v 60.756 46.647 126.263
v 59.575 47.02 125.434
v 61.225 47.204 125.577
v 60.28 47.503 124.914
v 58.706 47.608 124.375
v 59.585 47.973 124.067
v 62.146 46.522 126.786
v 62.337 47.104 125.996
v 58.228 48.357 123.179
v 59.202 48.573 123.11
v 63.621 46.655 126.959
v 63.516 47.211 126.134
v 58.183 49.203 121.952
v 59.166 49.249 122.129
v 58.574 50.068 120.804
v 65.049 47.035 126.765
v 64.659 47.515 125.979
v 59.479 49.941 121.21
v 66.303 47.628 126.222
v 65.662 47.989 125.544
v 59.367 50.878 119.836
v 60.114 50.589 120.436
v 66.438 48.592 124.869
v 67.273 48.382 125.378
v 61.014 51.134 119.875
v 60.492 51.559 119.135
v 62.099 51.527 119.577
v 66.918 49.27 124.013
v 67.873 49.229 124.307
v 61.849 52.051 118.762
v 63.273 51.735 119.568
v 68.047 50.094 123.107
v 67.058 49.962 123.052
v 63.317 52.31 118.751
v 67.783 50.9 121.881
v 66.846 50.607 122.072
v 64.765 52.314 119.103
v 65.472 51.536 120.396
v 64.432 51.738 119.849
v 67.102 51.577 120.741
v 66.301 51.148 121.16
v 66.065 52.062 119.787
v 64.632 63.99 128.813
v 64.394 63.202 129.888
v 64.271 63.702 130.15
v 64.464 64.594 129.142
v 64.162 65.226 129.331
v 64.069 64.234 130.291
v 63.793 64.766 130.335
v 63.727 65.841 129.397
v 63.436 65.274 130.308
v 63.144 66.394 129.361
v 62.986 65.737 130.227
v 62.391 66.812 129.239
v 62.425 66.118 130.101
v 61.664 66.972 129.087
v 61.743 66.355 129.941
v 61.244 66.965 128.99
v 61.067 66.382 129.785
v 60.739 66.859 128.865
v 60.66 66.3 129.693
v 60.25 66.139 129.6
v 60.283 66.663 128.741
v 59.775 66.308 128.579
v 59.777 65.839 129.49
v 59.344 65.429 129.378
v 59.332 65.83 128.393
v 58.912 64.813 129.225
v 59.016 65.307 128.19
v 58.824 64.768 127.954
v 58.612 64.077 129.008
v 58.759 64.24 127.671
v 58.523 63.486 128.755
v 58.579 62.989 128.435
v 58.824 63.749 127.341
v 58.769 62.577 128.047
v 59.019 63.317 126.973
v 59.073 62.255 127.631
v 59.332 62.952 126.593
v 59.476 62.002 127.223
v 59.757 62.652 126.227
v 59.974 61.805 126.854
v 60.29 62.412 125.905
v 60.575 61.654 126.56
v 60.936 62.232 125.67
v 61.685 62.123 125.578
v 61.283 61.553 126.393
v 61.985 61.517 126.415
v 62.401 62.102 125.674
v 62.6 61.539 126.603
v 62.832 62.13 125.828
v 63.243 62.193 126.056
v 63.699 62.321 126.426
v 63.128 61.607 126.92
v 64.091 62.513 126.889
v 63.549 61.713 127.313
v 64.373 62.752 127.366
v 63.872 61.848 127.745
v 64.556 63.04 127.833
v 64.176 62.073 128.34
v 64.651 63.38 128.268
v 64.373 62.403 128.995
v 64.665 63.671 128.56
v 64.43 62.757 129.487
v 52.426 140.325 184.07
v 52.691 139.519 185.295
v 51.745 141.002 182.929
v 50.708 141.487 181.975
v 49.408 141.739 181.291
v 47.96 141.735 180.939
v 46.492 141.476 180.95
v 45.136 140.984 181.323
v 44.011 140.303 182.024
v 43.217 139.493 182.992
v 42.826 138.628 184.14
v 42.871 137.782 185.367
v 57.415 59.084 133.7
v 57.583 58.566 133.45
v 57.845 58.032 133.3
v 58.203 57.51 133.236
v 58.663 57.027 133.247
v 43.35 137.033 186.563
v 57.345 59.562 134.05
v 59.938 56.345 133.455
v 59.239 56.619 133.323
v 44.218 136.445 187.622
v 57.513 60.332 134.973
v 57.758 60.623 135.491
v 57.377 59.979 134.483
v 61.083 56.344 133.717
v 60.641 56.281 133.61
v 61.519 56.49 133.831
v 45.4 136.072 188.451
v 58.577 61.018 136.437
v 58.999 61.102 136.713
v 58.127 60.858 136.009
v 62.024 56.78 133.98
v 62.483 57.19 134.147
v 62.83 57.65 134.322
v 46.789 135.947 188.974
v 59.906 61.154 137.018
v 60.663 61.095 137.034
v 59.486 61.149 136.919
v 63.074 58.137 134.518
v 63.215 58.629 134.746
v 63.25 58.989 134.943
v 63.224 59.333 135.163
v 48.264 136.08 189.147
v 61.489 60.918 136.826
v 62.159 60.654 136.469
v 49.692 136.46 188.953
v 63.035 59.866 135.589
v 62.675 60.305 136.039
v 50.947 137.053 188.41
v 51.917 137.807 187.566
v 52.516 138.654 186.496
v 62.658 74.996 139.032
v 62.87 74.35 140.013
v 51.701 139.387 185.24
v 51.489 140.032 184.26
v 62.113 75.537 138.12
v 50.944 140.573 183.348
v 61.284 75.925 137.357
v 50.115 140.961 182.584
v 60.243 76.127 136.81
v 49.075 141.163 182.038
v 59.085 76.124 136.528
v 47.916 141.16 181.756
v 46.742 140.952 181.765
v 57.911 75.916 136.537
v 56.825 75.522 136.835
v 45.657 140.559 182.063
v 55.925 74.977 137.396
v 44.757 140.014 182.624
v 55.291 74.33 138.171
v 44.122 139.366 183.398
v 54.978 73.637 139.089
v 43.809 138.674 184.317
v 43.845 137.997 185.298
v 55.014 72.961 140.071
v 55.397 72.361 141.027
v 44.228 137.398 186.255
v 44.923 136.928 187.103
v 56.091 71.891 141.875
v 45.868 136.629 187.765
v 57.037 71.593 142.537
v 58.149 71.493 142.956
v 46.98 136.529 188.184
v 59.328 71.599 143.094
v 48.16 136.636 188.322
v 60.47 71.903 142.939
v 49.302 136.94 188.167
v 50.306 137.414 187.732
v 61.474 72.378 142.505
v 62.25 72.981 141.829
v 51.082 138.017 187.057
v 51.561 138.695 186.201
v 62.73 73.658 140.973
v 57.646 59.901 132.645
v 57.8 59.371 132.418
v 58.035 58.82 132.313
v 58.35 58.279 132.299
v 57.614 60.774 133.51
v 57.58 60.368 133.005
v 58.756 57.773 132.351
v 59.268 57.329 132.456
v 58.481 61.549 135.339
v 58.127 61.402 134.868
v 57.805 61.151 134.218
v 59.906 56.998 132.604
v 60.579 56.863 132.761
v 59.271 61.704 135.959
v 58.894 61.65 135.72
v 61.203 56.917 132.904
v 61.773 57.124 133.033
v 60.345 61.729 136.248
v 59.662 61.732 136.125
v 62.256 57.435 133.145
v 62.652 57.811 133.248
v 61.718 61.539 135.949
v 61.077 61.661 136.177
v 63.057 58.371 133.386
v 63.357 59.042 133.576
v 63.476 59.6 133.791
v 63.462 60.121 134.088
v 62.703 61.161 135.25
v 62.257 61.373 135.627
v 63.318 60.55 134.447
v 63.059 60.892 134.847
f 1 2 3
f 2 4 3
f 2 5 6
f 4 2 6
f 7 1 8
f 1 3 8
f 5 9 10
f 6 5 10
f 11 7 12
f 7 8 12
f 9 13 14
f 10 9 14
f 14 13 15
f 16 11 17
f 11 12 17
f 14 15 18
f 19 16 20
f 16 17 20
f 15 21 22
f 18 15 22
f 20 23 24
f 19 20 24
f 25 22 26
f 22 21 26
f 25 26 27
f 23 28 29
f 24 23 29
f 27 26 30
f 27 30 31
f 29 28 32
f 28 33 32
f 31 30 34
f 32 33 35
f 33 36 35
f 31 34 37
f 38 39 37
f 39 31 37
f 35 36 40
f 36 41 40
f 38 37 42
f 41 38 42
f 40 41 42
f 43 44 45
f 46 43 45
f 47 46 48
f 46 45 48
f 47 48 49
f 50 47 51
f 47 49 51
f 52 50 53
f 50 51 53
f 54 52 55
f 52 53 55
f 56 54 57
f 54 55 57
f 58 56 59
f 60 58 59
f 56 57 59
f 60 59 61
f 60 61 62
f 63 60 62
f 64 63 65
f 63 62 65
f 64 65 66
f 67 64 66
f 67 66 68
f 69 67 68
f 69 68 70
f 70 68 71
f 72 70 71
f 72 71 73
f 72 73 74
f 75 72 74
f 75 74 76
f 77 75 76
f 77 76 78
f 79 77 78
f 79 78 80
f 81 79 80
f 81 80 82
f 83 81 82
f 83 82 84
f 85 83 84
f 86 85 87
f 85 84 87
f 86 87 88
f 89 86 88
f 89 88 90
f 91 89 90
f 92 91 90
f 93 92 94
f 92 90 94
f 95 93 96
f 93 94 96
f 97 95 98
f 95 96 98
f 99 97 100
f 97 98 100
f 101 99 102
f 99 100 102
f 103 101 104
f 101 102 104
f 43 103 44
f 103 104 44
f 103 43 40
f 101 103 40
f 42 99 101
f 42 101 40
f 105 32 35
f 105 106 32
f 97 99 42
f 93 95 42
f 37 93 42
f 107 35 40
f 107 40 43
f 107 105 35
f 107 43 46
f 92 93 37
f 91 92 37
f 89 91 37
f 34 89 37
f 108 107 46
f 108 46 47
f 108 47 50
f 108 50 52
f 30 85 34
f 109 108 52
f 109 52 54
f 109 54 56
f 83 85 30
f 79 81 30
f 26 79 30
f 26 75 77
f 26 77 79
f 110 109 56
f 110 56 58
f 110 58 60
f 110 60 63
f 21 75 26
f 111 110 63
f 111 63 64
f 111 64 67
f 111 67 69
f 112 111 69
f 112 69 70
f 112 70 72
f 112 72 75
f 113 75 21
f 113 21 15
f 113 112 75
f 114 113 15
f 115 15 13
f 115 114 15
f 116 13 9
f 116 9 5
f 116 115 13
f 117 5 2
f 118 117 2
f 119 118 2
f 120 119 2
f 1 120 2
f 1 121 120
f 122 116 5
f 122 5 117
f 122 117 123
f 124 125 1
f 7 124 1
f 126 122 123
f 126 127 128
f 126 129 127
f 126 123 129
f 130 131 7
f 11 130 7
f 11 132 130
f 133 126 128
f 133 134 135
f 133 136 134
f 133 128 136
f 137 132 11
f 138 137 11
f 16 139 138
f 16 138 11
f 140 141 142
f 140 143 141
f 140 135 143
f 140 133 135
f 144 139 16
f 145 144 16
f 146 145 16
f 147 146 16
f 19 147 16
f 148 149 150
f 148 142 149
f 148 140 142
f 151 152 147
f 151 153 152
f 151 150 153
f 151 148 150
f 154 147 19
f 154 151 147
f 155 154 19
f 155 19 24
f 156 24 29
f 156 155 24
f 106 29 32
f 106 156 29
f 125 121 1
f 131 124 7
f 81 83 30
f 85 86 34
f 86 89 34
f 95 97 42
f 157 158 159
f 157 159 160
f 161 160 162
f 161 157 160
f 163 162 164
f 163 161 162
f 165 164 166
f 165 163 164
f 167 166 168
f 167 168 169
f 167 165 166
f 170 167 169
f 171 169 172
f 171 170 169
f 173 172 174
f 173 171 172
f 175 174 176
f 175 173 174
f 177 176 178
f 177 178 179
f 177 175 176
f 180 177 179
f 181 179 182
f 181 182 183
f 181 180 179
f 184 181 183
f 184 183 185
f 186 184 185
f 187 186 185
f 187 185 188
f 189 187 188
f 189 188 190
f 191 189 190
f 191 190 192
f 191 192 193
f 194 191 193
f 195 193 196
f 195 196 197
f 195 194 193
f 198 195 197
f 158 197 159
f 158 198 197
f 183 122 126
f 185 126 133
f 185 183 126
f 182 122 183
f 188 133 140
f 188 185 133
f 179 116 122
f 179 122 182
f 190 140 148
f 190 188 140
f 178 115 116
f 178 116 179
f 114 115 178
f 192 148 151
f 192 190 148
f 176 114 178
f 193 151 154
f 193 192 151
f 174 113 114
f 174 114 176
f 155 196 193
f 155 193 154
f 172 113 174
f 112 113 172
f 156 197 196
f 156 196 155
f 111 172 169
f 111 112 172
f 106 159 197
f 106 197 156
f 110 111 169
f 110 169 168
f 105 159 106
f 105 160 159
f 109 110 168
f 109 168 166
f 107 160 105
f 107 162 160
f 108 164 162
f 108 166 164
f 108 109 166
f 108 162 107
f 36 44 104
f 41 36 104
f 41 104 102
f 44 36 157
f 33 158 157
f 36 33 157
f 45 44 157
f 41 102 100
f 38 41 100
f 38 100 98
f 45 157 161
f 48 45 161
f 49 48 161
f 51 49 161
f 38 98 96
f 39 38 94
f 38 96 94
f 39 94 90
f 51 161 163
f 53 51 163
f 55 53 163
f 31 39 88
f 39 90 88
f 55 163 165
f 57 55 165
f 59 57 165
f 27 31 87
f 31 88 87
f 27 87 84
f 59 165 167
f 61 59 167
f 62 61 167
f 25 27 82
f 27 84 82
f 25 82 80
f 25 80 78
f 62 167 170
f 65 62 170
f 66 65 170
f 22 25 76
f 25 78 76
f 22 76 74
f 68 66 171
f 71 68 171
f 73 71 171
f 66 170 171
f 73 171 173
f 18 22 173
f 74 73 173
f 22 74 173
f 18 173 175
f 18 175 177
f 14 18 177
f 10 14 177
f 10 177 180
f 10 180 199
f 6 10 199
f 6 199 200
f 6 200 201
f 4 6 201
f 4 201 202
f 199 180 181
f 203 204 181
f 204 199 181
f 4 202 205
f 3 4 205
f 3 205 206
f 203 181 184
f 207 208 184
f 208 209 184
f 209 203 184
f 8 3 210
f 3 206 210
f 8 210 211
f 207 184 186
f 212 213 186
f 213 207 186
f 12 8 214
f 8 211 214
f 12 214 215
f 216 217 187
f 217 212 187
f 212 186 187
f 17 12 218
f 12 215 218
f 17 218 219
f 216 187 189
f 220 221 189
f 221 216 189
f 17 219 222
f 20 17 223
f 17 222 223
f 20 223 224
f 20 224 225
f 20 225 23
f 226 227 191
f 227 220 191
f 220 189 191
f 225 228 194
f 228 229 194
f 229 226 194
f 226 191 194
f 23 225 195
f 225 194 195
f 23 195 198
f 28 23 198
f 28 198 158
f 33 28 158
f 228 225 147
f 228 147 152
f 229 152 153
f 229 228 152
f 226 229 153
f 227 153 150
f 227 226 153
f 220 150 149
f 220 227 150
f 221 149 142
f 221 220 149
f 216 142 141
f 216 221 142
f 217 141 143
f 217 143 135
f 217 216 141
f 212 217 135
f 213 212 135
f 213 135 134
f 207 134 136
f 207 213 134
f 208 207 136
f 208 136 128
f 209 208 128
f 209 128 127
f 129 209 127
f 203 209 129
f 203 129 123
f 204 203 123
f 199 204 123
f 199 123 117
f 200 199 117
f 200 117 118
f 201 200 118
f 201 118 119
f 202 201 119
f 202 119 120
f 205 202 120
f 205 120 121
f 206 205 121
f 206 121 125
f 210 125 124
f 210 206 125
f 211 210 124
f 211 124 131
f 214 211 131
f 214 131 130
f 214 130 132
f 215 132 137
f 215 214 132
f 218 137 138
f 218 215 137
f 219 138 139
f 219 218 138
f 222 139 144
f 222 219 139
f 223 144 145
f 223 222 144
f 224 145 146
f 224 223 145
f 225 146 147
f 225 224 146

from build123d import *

# Parameters (mm, degrees)
SKETCH1_R                = 5
SKETCH1_R_2              = 4
BOSS_EXTRUDE1_DEPTH      = 80
BOSS_EXTRUDE1_DEPTH_BACK = 30
SKETCH2_R                = 3
CUT_EXTRUDE1_DEPTH       = 58.904930039
CUT_EXTRUDE1_DEPTH_BACK  = 58.904930039


with BuildPart() as part:
    # Sketch1 → Boss-Extrude1 (new body, two sides)
    with BuildSketch(Plane(origin=(-18.263591419, 106.35230846, 73.959767463), x_dir=(0.989737493, 0.132142803, 0.054387259), z_dir=(-0.139606326, 0.812953742, 0.565346165))) as boss_extrude1_sk:
        with Locations((75.664084078, -74.988676697)):
            Circle(SKETCH1_R)
        with Locations((75.664084078, -74.988676697)):
            Circle(SKETCH1_R_2, mode=Mode.SUBTRACT)
    extrude(amount=BOSS_EXTRUDE1_DEPTH)
    extrude(boss_extrude1_sk.sketch, amount=-BOSS_EXTRUDE1_DEPTH_BACK)

    # Sketch2 → Cut-Extrude1 (cut, two sides)
    with BuildSketch(Plane(origin=(167.461192563, -27.829766449, 89.299122305), x_dir=(0.974445609, 0.011329449, 0.22433769), z_dir=(-0.175971104, -0.582218049, 0.793760867))) as cut_extrude1_sk:
        with Locations((-93.296905198, 111.340129179)):
            Circle(SKETCH2_R)
    extrude(amount=CUT_EXTRUDE1_DEPTH, mode=Mode.SUBTRACT)
    extrude(cut_extrude1_sk.sketch, amount=-CUT_EXTRUDE1_DEPTH_BACK, mode=Mode.SUBTRACT)


solid = part.part
